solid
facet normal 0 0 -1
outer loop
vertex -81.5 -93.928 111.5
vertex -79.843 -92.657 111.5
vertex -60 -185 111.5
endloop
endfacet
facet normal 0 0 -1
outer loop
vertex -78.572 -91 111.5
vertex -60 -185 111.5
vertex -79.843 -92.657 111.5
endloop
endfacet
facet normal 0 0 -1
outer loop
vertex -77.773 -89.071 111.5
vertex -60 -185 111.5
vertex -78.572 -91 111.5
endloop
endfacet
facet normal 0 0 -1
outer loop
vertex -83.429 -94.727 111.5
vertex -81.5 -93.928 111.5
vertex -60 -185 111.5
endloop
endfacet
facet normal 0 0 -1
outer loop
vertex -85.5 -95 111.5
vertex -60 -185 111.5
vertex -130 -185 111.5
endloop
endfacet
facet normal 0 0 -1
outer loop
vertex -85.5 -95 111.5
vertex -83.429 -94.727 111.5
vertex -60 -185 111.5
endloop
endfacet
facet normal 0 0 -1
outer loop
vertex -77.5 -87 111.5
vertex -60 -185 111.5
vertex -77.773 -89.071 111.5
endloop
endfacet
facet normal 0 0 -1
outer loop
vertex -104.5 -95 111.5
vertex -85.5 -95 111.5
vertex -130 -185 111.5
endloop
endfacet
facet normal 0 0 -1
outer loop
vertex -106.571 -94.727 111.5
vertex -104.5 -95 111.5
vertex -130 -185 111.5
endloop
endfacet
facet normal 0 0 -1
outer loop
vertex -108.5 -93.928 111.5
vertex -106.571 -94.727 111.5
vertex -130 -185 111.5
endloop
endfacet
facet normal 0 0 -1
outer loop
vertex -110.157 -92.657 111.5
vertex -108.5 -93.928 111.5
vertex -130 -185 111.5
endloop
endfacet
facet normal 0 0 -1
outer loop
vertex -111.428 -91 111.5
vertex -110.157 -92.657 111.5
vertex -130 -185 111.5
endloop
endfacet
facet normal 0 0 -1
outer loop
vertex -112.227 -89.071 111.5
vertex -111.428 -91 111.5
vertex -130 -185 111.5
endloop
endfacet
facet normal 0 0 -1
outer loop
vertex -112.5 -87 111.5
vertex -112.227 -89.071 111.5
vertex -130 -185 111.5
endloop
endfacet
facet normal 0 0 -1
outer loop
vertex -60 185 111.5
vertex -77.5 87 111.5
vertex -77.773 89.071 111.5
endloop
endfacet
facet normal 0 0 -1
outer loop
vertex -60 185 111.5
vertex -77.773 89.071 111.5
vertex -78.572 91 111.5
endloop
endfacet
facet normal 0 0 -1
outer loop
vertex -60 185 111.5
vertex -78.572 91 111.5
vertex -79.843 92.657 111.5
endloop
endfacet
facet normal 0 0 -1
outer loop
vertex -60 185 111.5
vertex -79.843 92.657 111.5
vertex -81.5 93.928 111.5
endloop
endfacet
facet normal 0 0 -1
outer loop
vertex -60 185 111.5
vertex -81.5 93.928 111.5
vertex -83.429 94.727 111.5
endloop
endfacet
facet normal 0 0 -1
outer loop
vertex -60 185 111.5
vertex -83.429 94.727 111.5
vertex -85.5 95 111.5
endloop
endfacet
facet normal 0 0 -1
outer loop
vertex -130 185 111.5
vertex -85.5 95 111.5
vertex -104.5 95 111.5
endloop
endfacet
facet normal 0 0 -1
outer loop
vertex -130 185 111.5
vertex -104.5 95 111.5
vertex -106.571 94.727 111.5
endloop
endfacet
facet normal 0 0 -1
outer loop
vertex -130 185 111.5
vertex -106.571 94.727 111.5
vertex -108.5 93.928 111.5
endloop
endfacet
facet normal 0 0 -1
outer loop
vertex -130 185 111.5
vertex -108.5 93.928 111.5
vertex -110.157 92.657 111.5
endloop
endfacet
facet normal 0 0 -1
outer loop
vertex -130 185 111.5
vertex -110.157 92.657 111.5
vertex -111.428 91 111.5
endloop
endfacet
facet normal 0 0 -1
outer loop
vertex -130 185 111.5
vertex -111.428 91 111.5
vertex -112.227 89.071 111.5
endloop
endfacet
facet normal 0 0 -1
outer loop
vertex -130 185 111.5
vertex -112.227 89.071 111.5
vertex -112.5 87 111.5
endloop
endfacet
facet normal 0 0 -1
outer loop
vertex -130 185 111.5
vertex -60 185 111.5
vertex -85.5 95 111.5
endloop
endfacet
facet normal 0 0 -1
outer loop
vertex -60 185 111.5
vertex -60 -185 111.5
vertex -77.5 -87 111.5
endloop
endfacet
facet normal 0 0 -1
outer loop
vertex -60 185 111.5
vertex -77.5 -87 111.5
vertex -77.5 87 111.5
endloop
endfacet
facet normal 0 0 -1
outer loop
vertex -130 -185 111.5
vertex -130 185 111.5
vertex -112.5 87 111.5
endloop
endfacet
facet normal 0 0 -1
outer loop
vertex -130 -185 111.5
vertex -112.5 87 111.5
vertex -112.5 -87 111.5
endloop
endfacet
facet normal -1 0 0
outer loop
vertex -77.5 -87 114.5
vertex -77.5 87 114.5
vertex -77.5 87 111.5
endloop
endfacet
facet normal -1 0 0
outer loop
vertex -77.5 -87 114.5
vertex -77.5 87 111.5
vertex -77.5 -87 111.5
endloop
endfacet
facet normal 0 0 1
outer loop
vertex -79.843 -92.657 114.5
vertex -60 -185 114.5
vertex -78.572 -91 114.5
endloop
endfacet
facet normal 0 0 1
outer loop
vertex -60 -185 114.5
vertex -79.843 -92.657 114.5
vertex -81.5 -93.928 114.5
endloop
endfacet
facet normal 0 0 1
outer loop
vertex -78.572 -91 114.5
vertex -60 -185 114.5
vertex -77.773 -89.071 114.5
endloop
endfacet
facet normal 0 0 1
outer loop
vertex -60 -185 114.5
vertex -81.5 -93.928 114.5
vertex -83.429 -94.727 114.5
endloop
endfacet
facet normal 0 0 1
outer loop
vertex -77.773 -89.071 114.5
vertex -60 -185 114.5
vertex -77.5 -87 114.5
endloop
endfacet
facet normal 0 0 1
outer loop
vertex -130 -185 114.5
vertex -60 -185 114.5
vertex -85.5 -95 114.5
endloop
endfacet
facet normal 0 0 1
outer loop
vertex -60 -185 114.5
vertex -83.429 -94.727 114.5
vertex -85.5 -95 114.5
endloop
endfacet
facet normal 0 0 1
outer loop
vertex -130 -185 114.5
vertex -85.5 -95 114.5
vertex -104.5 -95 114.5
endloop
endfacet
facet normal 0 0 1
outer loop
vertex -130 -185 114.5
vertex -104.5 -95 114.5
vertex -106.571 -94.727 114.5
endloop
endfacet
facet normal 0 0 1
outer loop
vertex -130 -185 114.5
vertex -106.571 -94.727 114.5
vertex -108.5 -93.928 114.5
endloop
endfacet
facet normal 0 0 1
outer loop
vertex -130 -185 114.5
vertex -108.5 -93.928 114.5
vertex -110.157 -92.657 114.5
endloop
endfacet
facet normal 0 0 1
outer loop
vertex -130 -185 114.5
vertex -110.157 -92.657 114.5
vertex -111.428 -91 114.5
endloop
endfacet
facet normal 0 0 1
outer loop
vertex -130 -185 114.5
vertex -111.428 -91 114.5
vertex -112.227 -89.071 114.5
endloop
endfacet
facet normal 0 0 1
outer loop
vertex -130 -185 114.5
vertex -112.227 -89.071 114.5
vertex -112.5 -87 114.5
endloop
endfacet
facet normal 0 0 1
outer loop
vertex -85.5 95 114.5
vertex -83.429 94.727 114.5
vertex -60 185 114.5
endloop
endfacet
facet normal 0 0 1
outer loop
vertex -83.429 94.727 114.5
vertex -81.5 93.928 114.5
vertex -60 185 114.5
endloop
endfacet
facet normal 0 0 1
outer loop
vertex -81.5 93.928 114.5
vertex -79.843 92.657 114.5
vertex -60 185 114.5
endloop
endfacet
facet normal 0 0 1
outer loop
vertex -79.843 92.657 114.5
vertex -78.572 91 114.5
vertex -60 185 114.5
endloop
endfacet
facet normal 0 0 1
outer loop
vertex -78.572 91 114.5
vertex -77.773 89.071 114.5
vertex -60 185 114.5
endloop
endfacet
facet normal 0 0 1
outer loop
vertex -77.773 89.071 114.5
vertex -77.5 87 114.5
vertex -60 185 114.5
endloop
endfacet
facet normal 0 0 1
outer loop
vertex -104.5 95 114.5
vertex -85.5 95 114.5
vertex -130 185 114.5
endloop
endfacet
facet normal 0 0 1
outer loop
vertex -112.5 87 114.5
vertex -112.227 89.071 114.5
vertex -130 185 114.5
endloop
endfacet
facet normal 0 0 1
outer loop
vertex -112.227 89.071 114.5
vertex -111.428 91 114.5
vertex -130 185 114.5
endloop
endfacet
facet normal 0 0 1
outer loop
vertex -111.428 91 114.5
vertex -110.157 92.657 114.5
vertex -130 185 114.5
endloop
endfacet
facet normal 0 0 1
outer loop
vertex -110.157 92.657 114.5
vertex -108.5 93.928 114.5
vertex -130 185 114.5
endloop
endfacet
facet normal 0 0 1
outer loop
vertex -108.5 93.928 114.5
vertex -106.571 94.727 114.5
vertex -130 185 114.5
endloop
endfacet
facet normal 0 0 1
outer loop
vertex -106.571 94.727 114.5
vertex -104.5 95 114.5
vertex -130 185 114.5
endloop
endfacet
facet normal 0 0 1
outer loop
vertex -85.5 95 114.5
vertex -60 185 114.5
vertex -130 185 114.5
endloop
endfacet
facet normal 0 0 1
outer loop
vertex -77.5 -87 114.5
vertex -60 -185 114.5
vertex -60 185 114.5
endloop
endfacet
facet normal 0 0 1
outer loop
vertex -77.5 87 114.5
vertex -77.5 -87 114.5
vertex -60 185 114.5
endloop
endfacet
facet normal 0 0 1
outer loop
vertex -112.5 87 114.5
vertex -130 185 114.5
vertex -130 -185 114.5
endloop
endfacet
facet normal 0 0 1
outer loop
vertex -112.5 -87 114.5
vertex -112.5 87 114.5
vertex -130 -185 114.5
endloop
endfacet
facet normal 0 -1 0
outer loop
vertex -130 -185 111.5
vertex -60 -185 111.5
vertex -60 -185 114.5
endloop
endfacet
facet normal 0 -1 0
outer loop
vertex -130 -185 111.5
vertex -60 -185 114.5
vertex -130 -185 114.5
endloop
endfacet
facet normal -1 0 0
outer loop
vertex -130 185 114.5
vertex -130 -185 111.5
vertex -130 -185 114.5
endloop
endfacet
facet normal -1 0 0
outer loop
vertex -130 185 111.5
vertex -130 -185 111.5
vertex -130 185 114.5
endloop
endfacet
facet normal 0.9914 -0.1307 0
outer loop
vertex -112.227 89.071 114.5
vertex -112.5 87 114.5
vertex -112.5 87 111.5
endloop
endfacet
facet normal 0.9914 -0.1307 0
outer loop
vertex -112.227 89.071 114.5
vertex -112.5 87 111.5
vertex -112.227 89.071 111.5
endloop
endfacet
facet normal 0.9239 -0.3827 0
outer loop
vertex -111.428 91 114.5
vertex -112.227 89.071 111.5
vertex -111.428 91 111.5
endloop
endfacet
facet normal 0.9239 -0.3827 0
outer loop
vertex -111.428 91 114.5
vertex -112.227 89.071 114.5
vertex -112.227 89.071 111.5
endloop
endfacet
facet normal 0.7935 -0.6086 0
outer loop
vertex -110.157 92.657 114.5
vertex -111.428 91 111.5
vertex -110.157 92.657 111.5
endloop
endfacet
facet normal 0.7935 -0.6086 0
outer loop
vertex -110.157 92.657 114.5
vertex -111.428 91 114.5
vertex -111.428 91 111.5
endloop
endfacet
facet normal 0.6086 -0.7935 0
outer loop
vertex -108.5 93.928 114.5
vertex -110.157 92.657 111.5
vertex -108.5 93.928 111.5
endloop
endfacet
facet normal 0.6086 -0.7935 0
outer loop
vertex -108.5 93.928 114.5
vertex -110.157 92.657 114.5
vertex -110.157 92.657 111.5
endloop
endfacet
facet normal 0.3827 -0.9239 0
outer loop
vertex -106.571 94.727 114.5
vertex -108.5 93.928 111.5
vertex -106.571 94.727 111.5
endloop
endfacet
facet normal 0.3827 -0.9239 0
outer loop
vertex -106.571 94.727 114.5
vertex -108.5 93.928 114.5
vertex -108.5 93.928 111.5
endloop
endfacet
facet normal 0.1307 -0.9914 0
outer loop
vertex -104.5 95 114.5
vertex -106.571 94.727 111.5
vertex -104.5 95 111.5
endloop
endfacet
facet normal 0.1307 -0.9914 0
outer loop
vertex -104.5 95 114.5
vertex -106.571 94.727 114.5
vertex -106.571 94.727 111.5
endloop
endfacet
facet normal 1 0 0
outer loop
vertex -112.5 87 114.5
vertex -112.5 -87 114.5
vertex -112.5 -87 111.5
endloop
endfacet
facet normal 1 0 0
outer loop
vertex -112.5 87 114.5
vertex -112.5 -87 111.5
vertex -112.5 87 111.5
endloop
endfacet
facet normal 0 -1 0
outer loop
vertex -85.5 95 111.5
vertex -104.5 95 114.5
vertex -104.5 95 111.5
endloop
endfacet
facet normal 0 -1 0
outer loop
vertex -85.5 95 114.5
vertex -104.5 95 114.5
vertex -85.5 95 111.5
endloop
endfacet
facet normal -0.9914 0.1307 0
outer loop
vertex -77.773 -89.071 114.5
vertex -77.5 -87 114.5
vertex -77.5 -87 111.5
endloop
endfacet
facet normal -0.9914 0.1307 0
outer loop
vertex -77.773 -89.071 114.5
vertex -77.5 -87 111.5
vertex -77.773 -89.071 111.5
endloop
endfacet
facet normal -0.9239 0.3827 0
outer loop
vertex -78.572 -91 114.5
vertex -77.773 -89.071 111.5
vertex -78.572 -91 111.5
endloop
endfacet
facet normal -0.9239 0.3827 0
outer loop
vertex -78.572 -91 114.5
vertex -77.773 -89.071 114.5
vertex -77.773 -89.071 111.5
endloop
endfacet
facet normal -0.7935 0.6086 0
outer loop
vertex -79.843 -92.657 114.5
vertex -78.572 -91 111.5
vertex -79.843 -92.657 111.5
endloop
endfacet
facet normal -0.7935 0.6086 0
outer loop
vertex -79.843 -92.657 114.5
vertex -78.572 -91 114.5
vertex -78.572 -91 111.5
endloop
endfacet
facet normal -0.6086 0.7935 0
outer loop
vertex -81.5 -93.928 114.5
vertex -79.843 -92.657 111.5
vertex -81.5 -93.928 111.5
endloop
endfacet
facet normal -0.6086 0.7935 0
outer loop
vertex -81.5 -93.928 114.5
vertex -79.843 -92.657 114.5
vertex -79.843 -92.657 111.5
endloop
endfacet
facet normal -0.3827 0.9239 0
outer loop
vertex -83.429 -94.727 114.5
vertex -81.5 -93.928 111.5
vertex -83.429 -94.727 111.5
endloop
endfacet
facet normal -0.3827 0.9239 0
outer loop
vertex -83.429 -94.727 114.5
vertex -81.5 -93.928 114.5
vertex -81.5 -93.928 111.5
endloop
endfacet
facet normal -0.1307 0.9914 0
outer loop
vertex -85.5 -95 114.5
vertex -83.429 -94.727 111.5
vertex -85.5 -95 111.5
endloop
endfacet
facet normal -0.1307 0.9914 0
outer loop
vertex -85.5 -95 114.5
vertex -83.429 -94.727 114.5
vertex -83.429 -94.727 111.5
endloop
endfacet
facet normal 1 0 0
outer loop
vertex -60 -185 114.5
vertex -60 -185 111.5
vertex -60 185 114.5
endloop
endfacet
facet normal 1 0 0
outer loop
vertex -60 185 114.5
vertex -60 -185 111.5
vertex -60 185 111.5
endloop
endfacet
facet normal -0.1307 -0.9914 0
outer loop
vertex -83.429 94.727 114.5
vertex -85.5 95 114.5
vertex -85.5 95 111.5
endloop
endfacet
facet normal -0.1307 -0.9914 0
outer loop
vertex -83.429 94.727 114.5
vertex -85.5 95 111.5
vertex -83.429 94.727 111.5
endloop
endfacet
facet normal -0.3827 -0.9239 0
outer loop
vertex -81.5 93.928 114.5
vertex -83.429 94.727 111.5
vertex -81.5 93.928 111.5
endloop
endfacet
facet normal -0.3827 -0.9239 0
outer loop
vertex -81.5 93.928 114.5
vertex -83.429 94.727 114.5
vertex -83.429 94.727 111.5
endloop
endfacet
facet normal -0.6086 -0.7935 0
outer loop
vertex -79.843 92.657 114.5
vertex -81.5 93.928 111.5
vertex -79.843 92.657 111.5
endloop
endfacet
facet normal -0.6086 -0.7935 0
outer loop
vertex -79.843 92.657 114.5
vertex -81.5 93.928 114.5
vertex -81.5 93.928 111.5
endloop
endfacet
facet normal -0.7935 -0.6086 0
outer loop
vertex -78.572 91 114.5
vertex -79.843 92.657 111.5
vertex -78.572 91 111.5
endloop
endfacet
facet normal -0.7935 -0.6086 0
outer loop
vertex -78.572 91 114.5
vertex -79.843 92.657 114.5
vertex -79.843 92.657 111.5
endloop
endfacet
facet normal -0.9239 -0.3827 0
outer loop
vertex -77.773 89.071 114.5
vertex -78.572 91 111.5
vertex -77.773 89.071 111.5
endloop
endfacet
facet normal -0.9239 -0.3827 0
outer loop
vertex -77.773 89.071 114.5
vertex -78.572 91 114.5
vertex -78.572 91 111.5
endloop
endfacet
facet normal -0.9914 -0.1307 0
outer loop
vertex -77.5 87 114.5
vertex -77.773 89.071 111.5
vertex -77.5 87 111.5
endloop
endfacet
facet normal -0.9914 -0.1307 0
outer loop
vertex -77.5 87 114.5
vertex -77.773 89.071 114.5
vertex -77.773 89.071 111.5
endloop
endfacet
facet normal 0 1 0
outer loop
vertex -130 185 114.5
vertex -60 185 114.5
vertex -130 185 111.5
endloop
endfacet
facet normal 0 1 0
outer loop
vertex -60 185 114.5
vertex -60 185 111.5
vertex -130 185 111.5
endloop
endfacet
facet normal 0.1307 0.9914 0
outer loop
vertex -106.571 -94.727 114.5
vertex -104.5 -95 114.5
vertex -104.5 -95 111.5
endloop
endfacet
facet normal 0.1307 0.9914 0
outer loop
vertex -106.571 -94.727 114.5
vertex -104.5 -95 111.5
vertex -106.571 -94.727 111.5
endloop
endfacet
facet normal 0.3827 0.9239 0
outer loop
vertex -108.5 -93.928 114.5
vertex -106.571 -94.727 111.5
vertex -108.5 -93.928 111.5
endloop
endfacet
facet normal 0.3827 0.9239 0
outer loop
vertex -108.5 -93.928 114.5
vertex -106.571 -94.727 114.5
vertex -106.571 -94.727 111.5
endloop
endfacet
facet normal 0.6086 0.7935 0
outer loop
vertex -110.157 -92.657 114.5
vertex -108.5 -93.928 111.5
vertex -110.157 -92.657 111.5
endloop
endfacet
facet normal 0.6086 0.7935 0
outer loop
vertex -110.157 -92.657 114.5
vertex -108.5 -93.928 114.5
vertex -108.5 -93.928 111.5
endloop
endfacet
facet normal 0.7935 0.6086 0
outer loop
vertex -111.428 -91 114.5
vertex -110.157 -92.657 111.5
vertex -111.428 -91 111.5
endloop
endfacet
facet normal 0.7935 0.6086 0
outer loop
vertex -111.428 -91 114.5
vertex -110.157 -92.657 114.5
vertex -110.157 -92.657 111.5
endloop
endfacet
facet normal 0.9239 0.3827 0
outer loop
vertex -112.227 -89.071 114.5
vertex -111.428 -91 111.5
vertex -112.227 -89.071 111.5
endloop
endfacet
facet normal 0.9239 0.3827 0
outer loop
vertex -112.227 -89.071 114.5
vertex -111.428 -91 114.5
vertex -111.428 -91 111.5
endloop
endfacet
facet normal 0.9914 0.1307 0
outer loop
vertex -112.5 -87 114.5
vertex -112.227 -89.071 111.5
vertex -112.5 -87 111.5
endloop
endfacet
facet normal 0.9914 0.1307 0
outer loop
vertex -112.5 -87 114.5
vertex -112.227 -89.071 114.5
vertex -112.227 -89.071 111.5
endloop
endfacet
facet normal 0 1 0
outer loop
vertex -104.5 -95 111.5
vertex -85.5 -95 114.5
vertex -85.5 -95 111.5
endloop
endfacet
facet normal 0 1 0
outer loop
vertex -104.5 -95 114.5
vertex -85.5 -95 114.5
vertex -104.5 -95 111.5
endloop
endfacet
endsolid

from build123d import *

# Parameters (mm, degrees)
SZKIC3_W                    = 70
SZKIC3_H                    = 370
DODANIE_WYCI_GNI_CIE1_DEPTH = 1.5
WYTNIJ_WYCI_GNI_CIE1_REACH  = 5


with BuildPart() as part:
    # Szkic3 → Dodanie-wyciągnięcie1 (new body, symmetric)
    with BuildSketch(Plane(origin=(0, 0, 113), x_dir=(-1, 0, 0), z_dir=(0, 0, -1))):
        with Locations((95, 0)):
            Rectangle(SZKIC3_W, SZKIC3_H)
    extrude(amount=DODANIE_WYCI_GNI_CIE1_DEPTH, both=True)

    # Szkic4 → Wytnij-wyciągnięcie1 (cut, up to next)
    with BuildSketch(Plane.XY.offset(114.5), mode=Mode.PRIVATE) as wytnij_wyci_gni_cie1_sk1:
        with BuildLine():
            Line((-85.5, -95), (-104.5, -95))
            ThreePointArc((-104.5, -95), (-110.156854249, -92.656854249), (-112.5, -87))
            Line((-112.5, -87), (-112.5, 87))
            ThreePointArc((-112.5, 87), (-110.156854249, 92.656854249), (-104.5, 95))
            Line((-104.5, 95), (-85.5, 95))
            ThreePointArc((-85.5, 95), (-79.843145751, 92.656854249), (-77.5, 87))
            Line((-77.5, 87), (-77.5, -87))
            ThreePointArc((-77.5, -87), (-79.843145751, -92.656854249), (-85.5, -95))
        make_face()
    wytnij_wyci_gni_cie1_tool1 = extrude(wytnij_wyci_gni_cie1_sk1.sketch, amount=-WYTNIJ_WYCI_GNI_CIE1_REACH, mode=Mode.PRIVATE) & part.part
    add(wytnij_wyci_gni_cie1_tool1.solids().sort_by_distance((-95, 0, 114.5))[0], mode=Mode.SUBTRACT)


solid = part.part
